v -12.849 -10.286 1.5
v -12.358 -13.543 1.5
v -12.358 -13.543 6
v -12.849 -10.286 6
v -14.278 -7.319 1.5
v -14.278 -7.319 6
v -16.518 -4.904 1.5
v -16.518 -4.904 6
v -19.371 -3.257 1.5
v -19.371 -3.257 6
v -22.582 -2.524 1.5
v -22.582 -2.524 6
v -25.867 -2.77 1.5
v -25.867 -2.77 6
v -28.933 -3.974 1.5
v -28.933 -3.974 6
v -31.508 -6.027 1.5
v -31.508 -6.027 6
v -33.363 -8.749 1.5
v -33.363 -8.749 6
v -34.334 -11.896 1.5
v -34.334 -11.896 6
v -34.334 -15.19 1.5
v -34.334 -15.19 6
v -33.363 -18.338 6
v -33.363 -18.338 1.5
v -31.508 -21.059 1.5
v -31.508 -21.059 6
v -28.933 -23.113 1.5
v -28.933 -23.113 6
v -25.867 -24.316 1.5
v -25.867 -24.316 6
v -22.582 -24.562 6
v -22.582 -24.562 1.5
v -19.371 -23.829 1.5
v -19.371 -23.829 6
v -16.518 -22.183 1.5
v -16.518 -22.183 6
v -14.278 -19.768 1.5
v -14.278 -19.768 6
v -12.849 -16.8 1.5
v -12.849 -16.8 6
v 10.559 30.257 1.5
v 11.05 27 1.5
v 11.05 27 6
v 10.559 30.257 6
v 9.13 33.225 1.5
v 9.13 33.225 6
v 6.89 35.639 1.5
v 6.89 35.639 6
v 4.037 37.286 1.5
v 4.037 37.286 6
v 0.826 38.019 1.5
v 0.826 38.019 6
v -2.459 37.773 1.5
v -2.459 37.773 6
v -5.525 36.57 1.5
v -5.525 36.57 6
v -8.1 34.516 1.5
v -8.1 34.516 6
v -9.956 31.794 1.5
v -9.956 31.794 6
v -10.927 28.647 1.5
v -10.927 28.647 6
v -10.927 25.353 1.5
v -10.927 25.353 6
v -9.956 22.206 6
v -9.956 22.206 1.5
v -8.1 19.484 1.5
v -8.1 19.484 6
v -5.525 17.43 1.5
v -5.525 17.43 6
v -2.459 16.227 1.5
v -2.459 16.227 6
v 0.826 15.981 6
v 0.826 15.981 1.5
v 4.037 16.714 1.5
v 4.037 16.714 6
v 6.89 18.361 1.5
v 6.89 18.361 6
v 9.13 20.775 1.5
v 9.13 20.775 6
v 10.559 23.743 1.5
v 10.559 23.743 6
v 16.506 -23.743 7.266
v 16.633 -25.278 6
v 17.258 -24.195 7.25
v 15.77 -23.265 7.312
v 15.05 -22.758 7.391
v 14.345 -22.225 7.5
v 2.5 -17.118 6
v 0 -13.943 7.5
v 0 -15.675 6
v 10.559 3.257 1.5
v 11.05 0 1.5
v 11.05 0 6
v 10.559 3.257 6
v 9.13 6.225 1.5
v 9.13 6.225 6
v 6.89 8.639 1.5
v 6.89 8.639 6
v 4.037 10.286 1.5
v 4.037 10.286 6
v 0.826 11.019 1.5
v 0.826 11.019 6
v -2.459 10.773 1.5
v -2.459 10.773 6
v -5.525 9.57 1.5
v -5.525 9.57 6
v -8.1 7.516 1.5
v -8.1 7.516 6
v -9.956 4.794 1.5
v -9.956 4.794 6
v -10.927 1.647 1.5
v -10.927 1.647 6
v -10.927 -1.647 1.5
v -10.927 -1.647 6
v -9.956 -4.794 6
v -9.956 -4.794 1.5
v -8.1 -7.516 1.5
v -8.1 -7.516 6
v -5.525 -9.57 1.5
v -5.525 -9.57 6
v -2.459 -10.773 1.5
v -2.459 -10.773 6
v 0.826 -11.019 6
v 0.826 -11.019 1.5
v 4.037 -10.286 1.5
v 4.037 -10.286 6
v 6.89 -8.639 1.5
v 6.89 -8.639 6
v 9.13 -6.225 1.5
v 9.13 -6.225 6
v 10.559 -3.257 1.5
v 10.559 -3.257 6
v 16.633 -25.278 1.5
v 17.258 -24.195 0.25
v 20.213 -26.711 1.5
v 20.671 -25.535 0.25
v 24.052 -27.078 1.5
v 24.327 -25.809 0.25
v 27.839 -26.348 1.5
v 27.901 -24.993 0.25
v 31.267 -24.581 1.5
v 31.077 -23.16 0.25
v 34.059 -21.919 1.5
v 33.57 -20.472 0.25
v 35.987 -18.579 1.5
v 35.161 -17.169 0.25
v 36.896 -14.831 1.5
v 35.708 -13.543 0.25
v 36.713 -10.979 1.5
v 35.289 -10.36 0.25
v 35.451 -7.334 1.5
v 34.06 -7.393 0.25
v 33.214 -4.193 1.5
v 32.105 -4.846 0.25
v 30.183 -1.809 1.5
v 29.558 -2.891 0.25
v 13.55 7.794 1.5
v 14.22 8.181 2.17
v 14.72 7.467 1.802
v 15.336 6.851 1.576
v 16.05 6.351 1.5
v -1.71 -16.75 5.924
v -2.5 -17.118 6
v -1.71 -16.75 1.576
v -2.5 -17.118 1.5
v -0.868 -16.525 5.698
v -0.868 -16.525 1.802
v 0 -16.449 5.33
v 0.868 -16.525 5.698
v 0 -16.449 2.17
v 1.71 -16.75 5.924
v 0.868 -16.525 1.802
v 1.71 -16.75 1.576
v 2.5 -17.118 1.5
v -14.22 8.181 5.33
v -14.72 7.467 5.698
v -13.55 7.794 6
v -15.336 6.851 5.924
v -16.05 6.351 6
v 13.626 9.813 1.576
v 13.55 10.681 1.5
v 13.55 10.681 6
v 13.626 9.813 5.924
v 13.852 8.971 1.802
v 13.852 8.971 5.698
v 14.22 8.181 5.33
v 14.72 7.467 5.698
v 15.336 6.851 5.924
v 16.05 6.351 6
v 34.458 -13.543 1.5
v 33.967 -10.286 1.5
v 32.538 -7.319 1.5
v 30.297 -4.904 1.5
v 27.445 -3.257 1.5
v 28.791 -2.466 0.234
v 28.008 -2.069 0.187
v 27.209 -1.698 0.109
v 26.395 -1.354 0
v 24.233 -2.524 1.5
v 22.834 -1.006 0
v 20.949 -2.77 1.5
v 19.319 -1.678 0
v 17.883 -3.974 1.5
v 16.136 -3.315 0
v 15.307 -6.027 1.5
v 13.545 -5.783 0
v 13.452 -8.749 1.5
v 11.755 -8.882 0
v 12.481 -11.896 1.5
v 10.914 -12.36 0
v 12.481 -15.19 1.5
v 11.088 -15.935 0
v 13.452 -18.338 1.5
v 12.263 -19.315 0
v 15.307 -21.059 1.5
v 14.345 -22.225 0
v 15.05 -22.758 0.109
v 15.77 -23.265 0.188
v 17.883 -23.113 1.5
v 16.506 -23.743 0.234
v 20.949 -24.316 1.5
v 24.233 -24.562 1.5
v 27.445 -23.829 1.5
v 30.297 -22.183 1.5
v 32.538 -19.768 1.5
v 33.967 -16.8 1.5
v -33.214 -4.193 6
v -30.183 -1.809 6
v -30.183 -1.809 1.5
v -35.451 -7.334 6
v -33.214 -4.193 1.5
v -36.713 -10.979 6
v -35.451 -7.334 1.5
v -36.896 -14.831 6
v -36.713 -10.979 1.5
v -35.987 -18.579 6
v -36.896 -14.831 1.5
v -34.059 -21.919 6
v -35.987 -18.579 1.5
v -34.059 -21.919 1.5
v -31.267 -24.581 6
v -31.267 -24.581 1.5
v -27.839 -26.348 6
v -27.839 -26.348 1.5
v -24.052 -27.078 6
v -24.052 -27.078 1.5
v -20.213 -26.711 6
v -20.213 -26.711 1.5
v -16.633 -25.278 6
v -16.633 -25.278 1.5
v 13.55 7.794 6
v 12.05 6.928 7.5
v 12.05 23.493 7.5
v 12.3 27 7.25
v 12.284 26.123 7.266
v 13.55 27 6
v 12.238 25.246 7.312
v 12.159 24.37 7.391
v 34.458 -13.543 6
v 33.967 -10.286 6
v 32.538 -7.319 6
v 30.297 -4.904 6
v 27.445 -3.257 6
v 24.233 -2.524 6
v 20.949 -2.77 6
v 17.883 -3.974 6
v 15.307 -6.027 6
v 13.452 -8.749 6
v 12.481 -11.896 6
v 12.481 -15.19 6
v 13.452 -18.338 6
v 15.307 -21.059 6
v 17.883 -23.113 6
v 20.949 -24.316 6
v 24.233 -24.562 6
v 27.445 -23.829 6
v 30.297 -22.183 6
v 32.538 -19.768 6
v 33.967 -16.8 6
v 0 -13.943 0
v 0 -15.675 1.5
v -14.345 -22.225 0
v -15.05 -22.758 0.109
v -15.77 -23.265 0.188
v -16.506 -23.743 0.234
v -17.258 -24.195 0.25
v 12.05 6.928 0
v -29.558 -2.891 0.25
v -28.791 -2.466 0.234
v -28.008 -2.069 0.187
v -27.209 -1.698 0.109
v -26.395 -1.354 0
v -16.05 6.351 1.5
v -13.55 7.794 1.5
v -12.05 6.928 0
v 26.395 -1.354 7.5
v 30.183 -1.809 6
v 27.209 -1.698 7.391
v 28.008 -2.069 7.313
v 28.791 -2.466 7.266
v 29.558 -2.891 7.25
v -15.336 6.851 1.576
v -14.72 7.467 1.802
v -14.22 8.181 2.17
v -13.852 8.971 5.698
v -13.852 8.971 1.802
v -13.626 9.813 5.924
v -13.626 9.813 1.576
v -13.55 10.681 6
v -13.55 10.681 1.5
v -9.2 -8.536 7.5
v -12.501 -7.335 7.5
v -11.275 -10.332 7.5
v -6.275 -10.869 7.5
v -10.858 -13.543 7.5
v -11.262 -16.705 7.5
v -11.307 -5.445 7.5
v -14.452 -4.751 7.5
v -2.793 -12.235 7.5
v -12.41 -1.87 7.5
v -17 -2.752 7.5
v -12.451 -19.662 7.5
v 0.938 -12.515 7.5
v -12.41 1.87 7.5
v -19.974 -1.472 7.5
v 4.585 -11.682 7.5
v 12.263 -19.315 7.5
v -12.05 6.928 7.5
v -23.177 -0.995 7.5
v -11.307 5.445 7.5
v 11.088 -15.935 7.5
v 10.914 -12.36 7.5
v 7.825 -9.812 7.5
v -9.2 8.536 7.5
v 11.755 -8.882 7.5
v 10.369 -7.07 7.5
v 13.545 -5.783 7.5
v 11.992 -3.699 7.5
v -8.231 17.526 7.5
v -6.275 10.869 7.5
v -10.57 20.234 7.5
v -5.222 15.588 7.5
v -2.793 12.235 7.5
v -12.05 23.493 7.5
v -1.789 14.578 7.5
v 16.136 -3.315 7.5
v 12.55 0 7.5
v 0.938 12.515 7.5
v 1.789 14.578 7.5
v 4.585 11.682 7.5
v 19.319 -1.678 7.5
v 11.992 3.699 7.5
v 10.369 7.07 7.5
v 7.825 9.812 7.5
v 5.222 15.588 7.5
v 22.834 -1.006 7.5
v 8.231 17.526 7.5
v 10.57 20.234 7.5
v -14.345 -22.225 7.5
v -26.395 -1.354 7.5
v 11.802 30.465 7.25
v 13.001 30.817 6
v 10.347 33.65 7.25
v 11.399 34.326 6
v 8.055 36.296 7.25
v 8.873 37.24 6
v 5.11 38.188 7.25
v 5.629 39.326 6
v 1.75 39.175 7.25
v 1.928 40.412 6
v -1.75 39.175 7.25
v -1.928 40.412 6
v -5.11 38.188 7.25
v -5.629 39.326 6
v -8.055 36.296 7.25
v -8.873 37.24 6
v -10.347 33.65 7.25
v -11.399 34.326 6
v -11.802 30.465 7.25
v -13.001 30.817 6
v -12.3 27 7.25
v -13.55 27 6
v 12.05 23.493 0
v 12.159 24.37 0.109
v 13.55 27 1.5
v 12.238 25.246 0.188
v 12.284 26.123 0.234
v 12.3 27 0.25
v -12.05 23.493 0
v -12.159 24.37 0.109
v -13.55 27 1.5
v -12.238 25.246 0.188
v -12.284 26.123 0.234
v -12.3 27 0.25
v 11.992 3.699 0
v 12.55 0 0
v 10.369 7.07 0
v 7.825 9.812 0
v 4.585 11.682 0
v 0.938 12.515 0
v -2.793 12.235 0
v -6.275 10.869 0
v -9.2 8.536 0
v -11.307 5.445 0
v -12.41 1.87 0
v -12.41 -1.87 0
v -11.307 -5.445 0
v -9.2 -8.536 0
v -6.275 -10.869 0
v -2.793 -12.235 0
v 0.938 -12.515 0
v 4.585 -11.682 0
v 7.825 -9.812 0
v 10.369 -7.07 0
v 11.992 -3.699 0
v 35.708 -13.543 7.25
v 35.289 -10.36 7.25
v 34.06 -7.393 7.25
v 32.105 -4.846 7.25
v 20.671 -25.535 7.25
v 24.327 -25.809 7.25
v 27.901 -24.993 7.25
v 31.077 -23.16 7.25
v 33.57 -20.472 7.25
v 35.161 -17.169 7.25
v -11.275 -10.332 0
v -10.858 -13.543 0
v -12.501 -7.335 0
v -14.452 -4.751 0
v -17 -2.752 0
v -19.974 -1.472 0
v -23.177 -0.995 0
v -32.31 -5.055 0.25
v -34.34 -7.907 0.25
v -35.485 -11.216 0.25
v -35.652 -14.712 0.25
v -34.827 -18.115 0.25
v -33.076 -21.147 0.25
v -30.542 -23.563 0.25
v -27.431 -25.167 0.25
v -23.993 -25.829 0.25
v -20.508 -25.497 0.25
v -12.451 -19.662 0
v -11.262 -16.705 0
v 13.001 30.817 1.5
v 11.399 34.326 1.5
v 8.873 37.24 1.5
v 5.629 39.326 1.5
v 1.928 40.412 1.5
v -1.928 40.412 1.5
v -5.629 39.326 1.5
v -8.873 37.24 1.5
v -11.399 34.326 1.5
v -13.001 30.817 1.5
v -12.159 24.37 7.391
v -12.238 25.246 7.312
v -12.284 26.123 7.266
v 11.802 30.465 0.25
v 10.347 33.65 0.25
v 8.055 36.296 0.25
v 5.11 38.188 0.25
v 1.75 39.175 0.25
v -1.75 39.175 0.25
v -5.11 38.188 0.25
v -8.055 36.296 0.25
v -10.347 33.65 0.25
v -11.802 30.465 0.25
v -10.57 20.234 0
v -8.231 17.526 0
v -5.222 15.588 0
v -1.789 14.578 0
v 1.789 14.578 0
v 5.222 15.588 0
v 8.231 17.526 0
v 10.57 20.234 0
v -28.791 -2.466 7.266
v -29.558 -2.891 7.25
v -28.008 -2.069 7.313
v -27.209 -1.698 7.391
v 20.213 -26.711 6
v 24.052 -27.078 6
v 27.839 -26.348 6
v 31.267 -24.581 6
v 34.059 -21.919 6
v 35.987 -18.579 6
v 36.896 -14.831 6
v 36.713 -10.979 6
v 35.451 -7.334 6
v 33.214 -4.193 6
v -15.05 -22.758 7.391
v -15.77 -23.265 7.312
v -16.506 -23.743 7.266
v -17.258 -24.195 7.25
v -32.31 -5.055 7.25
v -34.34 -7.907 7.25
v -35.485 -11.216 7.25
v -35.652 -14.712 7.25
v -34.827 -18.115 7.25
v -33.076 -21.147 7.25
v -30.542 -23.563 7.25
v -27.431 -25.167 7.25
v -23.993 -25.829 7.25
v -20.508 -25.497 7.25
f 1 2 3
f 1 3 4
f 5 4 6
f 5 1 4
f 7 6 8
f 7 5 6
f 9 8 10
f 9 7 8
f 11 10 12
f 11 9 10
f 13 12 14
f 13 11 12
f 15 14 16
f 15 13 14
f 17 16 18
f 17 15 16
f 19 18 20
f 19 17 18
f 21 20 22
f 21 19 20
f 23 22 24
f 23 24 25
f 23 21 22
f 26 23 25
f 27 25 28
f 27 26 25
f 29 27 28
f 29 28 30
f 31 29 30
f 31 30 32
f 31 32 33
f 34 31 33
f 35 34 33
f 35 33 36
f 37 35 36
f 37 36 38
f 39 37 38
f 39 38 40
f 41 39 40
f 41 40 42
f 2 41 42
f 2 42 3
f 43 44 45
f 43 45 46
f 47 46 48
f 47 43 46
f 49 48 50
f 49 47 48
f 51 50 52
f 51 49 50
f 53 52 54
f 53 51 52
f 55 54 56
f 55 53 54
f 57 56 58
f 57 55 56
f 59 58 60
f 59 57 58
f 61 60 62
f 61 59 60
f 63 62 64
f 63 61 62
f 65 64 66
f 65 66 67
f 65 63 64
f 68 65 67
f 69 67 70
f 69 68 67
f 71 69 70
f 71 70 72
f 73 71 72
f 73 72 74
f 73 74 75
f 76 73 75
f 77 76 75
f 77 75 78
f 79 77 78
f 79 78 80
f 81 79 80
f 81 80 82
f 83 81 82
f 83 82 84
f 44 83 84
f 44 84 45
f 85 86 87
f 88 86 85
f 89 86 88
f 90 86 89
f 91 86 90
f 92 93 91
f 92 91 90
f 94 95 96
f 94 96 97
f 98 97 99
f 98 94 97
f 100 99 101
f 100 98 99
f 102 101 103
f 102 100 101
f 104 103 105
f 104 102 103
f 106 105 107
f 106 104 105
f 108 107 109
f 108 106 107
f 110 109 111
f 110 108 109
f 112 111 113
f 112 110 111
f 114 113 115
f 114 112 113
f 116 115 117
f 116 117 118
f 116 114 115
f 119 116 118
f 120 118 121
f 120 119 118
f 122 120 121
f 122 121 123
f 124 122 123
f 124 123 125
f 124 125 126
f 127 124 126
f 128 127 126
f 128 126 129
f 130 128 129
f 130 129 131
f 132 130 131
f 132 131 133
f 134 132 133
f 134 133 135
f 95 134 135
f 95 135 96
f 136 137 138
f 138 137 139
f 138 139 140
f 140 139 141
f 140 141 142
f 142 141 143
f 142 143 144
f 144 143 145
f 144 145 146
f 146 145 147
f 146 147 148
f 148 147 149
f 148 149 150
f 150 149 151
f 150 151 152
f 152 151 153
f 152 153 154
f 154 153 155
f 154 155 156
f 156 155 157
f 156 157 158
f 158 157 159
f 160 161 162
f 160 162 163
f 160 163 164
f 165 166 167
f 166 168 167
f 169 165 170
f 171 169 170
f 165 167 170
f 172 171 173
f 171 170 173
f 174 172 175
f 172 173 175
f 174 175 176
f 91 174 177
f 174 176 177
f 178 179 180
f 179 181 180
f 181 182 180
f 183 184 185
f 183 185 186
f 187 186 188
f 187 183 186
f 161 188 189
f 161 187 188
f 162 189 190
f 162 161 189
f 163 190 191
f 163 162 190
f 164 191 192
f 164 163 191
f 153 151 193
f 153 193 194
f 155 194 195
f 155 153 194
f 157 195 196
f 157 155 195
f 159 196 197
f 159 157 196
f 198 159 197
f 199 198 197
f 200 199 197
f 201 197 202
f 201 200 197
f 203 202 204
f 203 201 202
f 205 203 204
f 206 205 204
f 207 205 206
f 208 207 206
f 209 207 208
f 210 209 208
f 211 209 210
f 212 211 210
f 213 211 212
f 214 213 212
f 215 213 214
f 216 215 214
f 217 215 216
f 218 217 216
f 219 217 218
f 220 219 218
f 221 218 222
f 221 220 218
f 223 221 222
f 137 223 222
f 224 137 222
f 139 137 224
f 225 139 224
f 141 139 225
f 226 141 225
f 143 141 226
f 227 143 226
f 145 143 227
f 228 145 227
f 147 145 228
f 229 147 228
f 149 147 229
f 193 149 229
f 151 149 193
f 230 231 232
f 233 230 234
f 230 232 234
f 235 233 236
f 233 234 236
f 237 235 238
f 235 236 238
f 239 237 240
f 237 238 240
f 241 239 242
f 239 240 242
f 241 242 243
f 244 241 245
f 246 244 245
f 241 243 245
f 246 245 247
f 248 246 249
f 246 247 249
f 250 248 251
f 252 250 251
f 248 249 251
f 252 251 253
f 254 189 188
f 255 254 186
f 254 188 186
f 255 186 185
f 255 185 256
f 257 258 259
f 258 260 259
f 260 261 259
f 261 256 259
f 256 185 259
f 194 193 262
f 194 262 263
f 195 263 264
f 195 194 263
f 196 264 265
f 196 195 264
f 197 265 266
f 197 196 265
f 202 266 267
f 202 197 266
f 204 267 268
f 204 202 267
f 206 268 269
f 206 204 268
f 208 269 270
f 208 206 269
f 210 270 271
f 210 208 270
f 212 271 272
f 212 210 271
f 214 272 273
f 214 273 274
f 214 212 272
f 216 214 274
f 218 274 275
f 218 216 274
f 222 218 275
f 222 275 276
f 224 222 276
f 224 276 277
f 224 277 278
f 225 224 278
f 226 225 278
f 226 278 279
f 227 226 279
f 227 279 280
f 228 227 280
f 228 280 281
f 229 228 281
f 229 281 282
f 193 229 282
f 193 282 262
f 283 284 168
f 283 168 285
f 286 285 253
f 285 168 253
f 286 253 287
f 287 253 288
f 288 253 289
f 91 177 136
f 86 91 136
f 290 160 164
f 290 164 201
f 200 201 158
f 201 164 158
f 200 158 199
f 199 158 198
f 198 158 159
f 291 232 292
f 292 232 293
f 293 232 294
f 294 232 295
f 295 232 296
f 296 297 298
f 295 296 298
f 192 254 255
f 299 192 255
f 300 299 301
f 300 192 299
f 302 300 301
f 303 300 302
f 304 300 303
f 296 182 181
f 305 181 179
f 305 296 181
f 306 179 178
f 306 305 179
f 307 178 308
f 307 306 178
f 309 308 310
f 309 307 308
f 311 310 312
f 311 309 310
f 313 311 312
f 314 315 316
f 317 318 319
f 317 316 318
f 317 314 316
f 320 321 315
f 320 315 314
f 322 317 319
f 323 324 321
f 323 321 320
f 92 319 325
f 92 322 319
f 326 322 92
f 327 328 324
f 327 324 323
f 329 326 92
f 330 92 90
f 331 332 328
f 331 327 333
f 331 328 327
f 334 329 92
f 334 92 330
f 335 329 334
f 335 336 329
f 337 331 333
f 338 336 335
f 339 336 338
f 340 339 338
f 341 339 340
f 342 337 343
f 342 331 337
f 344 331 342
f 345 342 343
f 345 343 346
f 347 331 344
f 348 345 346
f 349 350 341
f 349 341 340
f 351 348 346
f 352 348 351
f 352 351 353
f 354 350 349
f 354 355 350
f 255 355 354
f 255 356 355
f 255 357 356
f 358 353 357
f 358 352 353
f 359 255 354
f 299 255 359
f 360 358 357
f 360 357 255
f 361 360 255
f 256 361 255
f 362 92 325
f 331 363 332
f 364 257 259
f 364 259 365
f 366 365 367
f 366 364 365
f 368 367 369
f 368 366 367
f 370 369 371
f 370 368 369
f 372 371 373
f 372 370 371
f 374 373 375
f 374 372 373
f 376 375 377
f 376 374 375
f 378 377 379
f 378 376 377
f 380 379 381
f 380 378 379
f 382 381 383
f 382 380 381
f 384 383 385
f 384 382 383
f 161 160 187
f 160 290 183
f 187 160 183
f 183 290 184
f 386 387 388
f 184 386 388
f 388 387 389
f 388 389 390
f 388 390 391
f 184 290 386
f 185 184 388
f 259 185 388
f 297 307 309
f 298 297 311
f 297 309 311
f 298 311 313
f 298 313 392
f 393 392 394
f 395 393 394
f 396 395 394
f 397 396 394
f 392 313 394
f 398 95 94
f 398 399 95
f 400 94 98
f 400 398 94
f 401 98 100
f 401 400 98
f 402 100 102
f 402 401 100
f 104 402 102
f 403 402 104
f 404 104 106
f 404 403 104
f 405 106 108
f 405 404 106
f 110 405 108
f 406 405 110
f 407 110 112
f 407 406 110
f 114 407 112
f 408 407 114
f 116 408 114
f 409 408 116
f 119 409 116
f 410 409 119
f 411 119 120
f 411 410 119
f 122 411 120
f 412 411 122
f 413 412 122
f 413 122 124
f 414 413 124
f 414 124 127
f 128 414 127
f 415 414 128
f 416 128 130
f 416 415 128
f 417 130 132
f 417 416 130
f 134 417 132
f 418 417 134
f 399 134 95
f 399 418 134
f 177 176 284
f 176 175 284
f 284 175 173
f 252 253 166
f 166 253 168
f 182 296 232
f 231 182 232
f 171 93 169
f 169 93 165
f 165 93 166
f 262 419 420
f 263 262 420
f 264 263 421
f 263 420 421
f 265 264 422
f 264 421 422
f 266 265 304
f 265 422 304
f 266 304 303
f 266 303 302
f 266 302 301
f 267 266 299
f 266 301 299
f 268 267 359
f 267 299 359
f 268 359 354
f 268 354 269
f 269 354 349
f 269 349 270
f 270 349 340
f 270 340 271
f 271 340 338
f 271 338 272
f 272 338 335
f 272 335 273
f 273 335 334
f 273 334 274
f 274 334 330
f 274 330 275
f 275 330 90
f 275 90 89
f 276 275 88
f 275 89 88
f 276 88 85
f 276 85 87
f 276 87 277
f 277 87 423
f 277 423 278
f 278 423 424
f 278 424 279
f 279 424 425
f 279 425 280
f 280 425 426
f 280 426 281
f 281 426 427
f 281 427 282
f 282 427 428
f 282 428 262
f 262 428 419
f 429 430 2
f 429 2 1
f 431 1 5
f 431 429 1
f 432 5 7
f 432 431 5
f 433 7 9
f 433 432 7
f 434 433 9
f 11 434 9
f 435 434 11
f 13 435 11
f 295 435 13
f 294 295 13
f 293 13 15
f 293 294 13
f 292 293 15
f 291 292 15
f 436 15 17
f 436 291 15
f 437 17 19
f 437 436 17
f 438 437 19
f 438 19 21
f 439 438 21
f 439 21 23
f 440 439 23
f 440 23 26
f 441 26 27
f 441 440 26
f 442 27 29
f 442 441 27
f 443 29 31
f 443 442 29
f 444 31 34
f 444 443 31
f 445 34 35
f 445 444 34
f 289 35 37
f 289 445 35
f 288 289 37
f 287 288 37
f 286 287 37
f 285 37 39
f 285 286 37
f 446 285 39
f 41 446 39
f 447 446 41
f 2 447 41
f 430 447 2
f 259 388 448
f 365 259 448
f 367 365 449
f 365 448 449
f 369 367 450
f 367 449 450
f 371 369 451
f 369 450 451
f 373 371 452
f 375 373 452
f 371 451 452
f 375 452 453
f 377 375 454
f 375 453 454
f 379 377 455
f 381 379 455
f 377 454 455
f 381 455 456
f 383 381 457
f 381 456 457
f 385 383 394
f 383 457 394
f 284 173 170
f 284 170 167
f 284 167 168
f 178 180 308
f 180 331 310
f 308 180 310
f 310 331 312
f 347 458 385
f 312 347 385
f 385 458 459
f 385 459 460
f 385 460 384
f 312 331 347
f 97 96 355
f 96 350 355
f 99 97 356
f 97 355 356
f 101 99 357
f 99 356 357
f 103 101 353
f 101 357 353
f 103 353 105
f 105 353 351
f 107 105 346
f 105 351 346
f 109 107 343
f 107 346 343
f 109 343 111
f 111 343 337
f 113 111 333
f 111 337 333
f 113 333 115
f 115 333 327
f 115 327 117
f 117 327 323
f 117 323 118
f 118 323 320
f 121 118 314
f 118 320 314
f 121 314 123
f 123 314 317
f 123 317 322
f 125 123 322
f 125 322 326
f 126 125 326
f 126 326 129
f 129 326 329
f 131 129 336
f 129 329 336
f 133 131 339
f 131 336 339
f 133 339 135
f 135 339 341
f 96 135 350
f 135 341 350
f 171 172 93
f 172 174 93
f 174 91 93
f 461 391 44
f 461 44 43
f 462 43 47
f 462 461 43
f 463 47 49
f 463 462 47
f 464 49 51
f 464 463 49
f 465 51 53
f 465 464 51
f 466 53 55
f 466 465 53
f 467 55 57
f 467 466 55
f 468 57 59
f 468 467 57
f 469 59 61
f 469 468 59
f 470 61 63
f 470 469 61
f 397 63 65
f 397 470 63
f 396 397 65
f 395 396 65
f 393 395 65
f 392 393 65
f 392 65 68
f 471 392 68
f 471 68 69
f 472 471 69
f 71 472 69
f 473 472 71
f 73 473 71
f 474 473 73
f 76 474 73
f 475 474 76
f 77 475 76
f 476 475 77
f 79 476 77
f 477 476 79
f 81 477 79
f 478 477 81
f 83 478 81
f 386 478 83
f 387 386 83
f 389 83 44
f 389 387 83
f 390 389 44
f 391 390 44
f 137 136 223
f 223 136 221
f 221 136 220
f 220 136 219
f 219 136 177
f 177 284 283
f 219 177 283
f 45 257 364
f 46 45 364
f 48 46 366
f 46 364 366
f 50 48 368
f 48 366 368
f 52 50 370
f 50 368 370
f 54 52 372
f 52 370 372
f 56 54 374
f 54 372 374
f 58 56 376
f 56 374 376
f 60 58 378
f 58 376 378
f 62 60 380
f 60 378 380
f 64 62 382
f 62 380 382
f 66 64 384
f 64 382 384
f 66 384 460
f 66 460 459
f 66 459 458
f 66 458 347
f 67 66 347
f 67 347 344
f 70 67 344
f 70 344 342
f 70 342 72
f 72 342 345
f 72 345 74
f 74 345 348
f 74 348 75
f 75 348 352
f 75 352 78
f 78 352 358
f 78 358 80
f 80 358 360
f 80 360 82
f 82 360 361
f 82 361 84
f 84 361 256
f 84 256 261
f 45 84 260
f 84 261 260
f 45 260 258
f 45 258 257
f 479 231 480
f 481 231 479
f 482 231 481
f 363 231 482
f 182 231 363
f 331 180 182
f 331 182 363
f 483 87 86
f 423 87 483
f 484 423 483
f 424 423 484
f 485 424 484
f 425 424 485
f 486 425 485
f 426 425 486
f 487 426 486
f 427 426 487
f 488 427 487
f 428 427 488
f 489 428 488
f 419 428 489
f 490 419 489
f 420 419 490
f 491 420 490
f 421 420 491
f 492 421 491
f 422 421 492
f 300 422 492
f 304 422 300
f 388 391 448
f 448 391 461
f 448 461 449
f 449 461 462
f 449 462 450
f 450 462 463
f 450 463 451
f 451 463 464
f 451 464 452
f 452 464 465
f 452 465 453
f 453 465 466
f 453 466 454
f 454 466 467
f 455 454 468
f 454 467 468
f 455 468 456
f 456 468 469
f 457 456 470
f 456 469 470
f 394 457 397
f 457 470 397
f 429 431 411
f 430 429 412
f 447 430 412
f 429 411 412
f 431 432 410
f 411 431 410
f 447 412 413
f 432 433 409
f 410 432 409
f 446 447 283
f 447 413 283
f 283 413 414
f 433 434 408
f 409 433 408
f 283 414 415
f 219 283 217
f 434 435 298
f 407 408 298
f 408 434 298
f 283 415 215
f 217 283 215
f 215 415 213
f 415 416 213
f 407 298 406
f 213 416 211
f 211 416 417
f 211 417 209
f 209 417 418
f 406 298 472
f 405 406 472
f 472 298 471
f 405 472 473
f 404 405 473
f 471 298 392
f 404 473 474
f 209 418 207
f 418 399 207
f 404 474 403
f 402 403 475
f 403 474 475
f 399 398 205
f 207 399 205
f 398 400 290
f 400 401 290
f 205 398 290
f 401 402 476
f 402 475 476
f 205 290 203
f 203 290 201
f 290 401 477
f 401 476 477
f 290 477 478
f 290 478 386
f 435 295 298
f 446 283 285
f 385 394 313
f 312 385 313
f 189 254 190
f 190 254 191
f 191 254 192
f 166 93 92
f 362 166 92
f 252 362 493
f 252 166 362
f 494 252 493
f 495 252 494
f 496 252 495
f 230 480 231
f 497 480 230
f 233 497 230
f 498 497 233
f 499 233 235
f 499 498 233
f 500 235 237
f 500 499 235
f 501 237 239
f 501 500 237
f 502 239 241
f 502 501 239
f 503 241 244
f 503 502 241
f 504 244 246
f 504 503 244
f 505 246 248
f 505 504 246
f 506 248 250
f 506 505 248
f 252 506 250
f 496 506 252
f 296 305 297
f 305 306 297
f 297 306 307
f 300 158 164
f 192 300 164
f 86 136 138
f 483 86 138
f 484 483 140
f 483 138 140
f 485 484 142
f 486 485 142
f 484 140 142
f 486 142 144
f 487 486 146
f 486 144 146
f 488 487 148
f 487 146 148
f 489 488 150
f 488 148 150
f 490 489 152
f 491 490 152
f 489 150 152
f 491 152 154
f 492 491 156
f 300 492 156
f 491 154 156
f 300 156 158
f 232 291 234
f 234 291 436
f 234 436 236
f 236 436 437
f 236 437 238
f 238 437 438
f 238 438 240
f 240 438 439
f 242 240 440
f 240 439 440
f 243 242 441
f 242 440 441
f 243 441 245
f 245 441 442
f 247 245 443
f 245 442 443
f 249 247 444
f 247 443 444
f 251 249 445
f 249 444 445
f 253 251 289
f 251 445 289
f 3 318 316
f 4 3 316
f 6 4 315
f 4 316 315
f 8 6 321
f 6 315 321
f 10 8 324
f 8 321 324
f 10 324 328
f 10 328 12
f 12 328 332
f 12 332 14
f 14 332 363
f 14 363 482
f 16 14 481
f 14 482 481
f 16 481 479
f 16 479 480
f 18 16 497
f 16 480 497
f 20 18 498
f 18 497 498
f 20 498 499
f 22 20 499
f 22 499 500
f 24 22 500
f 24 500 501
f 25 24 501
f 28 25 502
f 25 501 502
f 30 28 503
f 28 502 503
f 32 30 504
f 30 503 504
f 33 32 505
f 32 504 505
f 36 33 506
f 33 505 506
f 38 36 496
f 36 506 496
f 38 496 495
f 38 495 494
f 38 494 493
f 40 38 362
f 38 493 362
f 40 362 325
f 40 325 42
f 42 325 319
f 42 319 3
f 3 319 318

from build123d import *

# Parameters (mm, degrees)
F0_R          = 11.05
F1_DEPTH      = 7.5
F2_T4_DEPTH   = 23.0632958479
F2_T9_DEPTH   = 23.0632958479
F2_T14_DEPTH  = 23.0632958479
F2_T27_DEPTH  = 23.0632958479
F2_T32_DEPTH  = 23.0632958479
F2_T37_DEPTH  = 23.0632958479
F2_T50_DEPTH  = 23.0632958479
F2_T55_DEPTH  = 23.0632958479
F2_T60_DEPTH  = 23.0632958479
F2_T65_DEPTH  = 23.0632958479
F2_T70_DEPTH  = 23.0632958479
F2_T75_DEPTH  = 23.0632958479
F2_T78_ANGLE  = 180
F2_T80_ANGLE  = 180
F2_T82_ANGLE  = 180
F2_T84_ANGLE  = 180
F2_T86_ANGLE  = 180
F2_T88_ANGLE  = 180
F2_T93_DEPTH  = 23.0632958479
F2_T97_DEPTH  = 23.0632958479
F2_T104_DEPTH = 23.0632958479
F2_T108_DEPTH = 23.0632958479
F2_T115_DEPTH = 23.0632958479
F2_T119_DEPTH = 23.0632958479
F2_T126_DEPTH = 23.0632958479
F2_T130_DEPTH = 23.0632958479
F2_T137_DEPTH = 23.0632958479
F2_T141_DEPTH = 23.0632958479
F2_T148_DEPTH = 23.0632958479
F2_T152_DEPTH = 23.0632958479
F3_T4_DEPTH   = 18.9337567297
F3_T10_DEPTH  = 18.9337567297
F3_T16_DEPTH  = 18.9337567297
F3_T22_DEPTH  = 18.9337567297
F3_T28_DEPTH  = 18.9337567297
F3_T34_DEPTH  = 18.9337567297
F3_T40_DEPTH  = 18.9337567297
F3_T46_DEPTH  = 18.9337567297
F3_T52_DEPTH  = 18.9337567297
F3_T58_DEPTH  = 18.9337567297


# Not quite as in the source:
# - a fillet or chamfer that OpenCascade refuses, or shapes differently, is made with other operations: its cross-section is extruded or revolved along the edge and cut away or added


with BuildPart() as f1:
    # F0 (on Top) → F1 (new body)
    with BuildSketch(Plane.XY):
        with BuildLine():
            ThreePointArc((13.55, 27), (0, 40.55), (-13.55, 27))
            Line((-13.55, 27), (-13.55, 7.7942286341))
            Line((-13.55, 7.7942286341), (-30.1826859022, -1.8086570489))
            ThreePointArc((-30.1826859022, -1.8086570489), (-35.1423301235, -20.3183012702), (-16.6326859022, -25.2779454915))
            Line((-16.6326859022, -25.2779454915), (0, -15.6750598085))
            Line((0, -15.6750598085), (16.6326859022, -25.2779454915))
            ThreePointArc((16.6326859022, -25.2779454915), (35.1423301235, -20.3183012702), (30.1826859022, -1.8086570489))
            Line((30.1826859022, -1.8086570489), (13.55, 7.7942286341))
            Line((13.55, 7.7942286341), (13.55, 27))
        make_face()
        with Locations((-23.4076859022, -13.5433012702)):
            Circle(F0_R, mode=Mode.SUBTRACT)
        with Locations((23.4076859022, -13.5433012702)):
            Circle(F0_R, mode=Mode.SUBTRACT)
        Circle(F0_R, mode=Mode.SUBTRACT)
        with Locations((0, 27)):
            Circle(F0_R, mode=Mode.SUBTRACT)
    extrude(amount=F1_DEPTH)

    # F2: chamfer of 1.5 on 20 edges, made by hand


with BuildPart() as f2_tool2:
    # F2_s3 → F2_t4 (new body)
    with BuildSketch(Plane(origin=(-23.4201859022, -13.5216506351, 0), x_dir=(0, 0, 1), z_dir=(0.8660254038, 0.5, 0))):
        Polygon((6, 13.575), (7.5, 12.075), (7.5, 13.575), align=None)
    extrude(amount=F2_T4_DEPTH)

    split(bisect_by=Plane(origin=(-6.7875, -11.7562948564, 0), x_dir=(0, 0, 1), z_dir=(-0.5, -0.8660254038, 0)), keep=Keep.TOP)


with BuildPart() as f1_1:
    add(f1.part)

    # F2_t1: cut F2_tool2
    add(f2_tool2.part, mode=Mode.SUBTRACT)


with BuildPart() as f2_tool7:
    # F2_s8 → F2_t9 (new body)
    with BuildSketch(Plane.XZ.offset(-27)):
        Polygon((-13.55, 6), (-12.05, 7.5), (-13.55, 7.5), align=None)
    extrude(amount=F2_T9_DEPTH)

    split(bisect_by=Plane(origin=(-6.7625, 11.7129935862, 0), x_dir=(0, 0, 1), z_dir=(-0.5, 0.8660254038, 0)), keep=Keep.TOP)


with BuildPart() as f1_2:
    add(f1_1.part)

    # F2_t6: cut F2_tool7
    add(f2_tool7.part, mode=Mode.SUBTRACT)


with BuildPart() as f2_tool12:
    # F2_s13 → F2_t14 (new body)
    with BuildSketch(Plane(origin=(3.4467858029, -1.9900027112, 0), x_dir=(0, 0, 1), z_dir=(0.8660254038, -0.5, 0))):
        Polygon((6, 13.575), (7.5, 12.075), (7.5, 13.575), align=None)
    extrude(amount=F2_T14_DEPTH)

    split(bisect_by=Plane(origin=(6.7875, -11.7562948564, 0), x_dir=(0, 0, 1), z_dir=(0.5, -0.8660254038, 0)), keep=Keep.TOP)


with BuildPart() as f1_3:
    add(f1_2.part)

    # F2_t11: cut F2_tool12
    add(f2_tool12.part, mode=Mode.SUBTRACT)

    # F2_s16 → F2_t17 (revolve, cut)
    with BuildSketch(Plane.XZ.offset(13.5433012702)):
        Polygon((-12.3576859022, 6), (-10.8576859022, 7.5), (-12.3576859022, 7.5), align=None)
    revolve(axis=Axis((-23.4076859022, -13.5433012702, 7.5), (0, 0, 1)), mode=Mode.SUBTRACT)

    # F2_s18 → F2_t19 (revolve, cut)
    with BuildSketch(Plane.XZ):
        Polygon((11.05, 6), (12.55, 7.5), (11.05, 7.5), align=None)
    revolve(axis=Axis((0, 0, 7.5), (0, 0, 1)), mode=Mode.SUBTRACT)

    # F2_s20 → F2_t21 (revolve, cut)
    with BuildSketch(Plane.XZ.offset(-27)):
        Polygon((11.05, 6), (12.55, 7.5), (11.05, 7.5), align=None)
    revolve(axis=Axis((0, 27, 7.5), (0, 0, 1)), mode=Mode.SUBTRACT)

    # F2_s22 → F2_t23 (revolve, cut)
    with BuildSketch(Plane.XZ.offset(13.5433012702)):
        Polygon((34.4576859022, 6), (35.9576859022, 7.5), (34.4576859022, 7.5), align=None)
    revolve(axis=Axis((23.4076859022, -13.5433012702, 7.5), (0, 0, 1)), mode=Mode.SUBTRACT)


with BuildPart() as f2_tool25:
    # F2_s26 → F2_t27 (new body)
    with BuildSketch(Plane.XZ.offset(-27)):
        Polygon((-13.55, 1.5), (-12.05, 0), (-13.55, 0), align=None)
    extrude(amount=F2_T27_DEPTH)

    split(bisect_by=Plane(origin=(-6.7625, 11.7129935862, 0), x_dir=(0, 0, 1), z_dir=(-0.5, 0.8660254038, 0)), keep=Keep.TOP)


with BuildPart() as f1_4:
    add(f1_3.part)

    # F2_t24: cut F2_tool25
    add(f2_tool25.part, mode=Mode.SUBTRACT)


with BuildPart() as f2_tool30:
    # F2_s31 → F2_t32 (new body)
    with BuildSketch(Plane(origin=(-3.4467858029, -1.9900027112, 0), x_dir=(0, 0, 1), z_dir=(-0.8660254038, -0.5, 0))):
        Polygon((1.5, 13.525), (0, 12.025), (0, 13.525), align=None)
    extrude(amount=F2_T32_DEPTH)

    split(bisect_by=Plane.YZ.offset(-13.55), keep=Keep.BOTTOM)


with BuildPart() as f1_5:
    add(f1_4.part)

    # F2_t29: cut F2_tool30
    add(f2_tool30.part, mode=Mode.SUBTRACT)


with BuildPart() as f2_tool35:
    # F2_s36 → F2_t37 (new body)
    with BuildSketch(Plane(origin=(3.4467858029, -1.9900027112, 0), x_dir=(0, 0, 1), z_dir=(0.8660254038, -0.5, 0))):
        Polygon((1.5, 13.575), (0, 12.075), (0, 13.575), align=None)
    extrude(amount=F2_T37_DEPTH)

    split(bisect_by=Plane(origin=(6.7875, -11.7562948564, 0), x_dir=(0, 0, 1), z_dir=(0.5, -0.8660254038, 0)), keep=Keep.TOP)


with BuildPart() as f1_6:
    add(f1_5.part)

    # F2_t34: cut F2_tool35
    add(f2_tool35.part, mode=Mode.SUBTRACT)

    # F2_s39 → F2_t40 (revolve, cut)
    with BuildSketch(Plane.XZ.offset(13.5433012702)):
        Polygon((34.4576859022, 1.5), (35.9576859022, 0), (34.4576859022, 0), align=None)
    revolve(axis=Axis((23.4076859022, -13.5433012702, 0), (0, 0, 1)), mode=Mode.SUBTRACT)

    # F2_s41 → F2_t42 (revolve, cut)
    with BuildSketch(Plane.XZ):
        Polygon((11.05, 1.5), (12.55, 0), (11.05, 0), align=None)
    revolve(axis=Axis((0, 0, 0), (0, 0, 1)), mode=Mode.SUBTRACT)

    # F2_s43 → F2_t44 (revolve, cut)
    with BuildSketch(Plane.XZ.offset(13.5433012702)):
        Polygon((-12.3576859022, 1.5), (-10.8576859022, 0), (-12.3576859022, 0), align=None)
    revolve(axis=Axis((-23.4076859022, -13.5433012702, 0), (0, 0, 1)), mode=Mode.SUBTRACT)

    # F2_s45 → F2_t46 (revolve, cut)
    with BuildSketch(Plane.XZ.offset(-27)):
        Polygon((11.05, 1.5), (12.55, 0), (11.05, 0), align=None)
    revolve(axis=Axis((0, 27, 0), (0, 0, 1)), mode=Mode.SUBTRACT)


with BuildPart() as f2_tool48:
    # F2_s49 → F2_t50 (new body)
    with BuildSketch(Plane(origin=(-23.4201859022, -13.5216506351, 0), x_dir=(0, 0, 1), z_dir=(0.8660254038, 0.5, 0))):
        Polygon((1.5, 13.575), (0, 12.075), (0, 13.575), align=None)
    extrude(amount=F2_T50_DEPTH)

    split(bisect_by=Plane(origin=(-6.7875, -11.7562948564, 0), x_dir=(0, 0, 1), z_dir=(-0.5, -0.8660254038, 0)), keep=Keep.TOP)


with BuildPart() as f1_7:
    add(f1_6.part)

    # F2_t47: cut F2_tool48
    add(f2_tool48.part, mode=Mode.SUBTRACT)


with BuildPart() as f2_tool53:
    # F2_s54 → F2_t55 (new body)
    with BuildSketch(Plane(origin=(23.4201859022, -13.5216506351, 0), x_dir=(0, 0, 1), z_dir=(-0.8660254038, 0.5, 0))):
        Polygon((1.5, 13.525), (0, 12.025), (0, 13.525), align=None)
    extrude(amount=F2_T55_DEPTH)

    split(bisect_by=Plane.YZ.offset(13.55), keep=Keep.TOP)


with BuildPart() as f1_8:
    add(f1_7.part)

    # F2_t52: cut F2_tool53
    add(f2_tool53.part, mode=Mode.SUBTRACT)


with BuildPart() as f2_tool58:
    # F2_s59 → F2_t60 (new body)
    with BuildSketch(Plane(origin=(23.4201859022, -13.5216506351, 0), x_dir=(0, 0, 1), z_dir=(-0.8660254038, 0.5, 0))):
        Polygon((6, 13.525), (7.5, 12.025), (7.5, 13.525), align=None)
    extrude(amount=F2_T60_DEPTH)

    split(bisect_by=Plane.YZ.offset(13.55), keep=Keep.TOP)


with BuildPart() as f1_9:
    add(f1_8.part)

    # F2_t57: cut F2_tool58
    add(f2_tool58.part, mode=Mode.SUBTRACT)


with BuildPart() as f2_tool63:
    # F2_s64 → F2_t65 (new body)
    with BuildSketch(Plane.XZ.offset(-3.9367041521)):
        Polygon((13.55, 1.5), (12.05, 0), (13.55, 0), align=None)
    extrude(amount=-F2_T65_DEPTH)

    split(bisect_by=Plane(origin=(6.7625, 11.7129935862, 0), x_dir=(0, 0, 1), z_dir=(0.5, 0.8660254038, 0)), keep=Keep.TOP)


with BuildPart() as f1_10:
    add(f1_9.part)

    # F2_t62: cut F2_tool63
    add(f2_tool63.part, mode=Mode.SUBTRACT)


with BuildPart() as f2_tool68:
    # F2_s69 → F2_t70 (new body)
    with BuildSketch(Plane.XZ.offset(-3.9367041521)):
        Polygon((13.55, 6), (12.05, 7.5), (13.55, 7.5), align=None)
    extrude(amount=-F2_T70_DEPTH)

    split(bisect_by=Plane(origin=(6.7625, 11.7129935862, 0), x_dir=(0, 0, 1), z_dir=(0.5, 0.8660254038, 0)), keep=Keep.TOP)


with BuildPart() as f1_11:
    add(f1_10.part)

    # F2_t67: cut F2_tool68
    add(f2_tool68.part, mode=Mode.SUBTRACT)


with BuildPart() as f2_tool73:
    # F2_s74 → F2_t75 (new body)
    with BuildSketch(Plane(origin=(-3.4467858029, -1.9900027112, 0), x_dir=(0, 0, 1), z_dir=(-0.8660254038, -0.5, 0))):
        Polygon((6, 13.525), (7.5, 12.025), (7.5, 13.525), align=None)
    extrude(amount=F2_T75_DEPTH)

    split(bisect_by=Plane.YZ.offset(-13.55), keep=Keep.BOTTOM)


with BuildPart() as f1_12:
    add(f1_11.part)

    # F2_t72: cut F2_tool73
    add(f2_tool73.part, mode=Mode.SUBTRACT)

    # F2_s77 → F2_t78 (revolve, cut)
    with BuildSketch(Plane(origin=(-23.4201859022, -13.5216506351, 0), x_dir=(0, 0, 1), z_dir=(0.8660254038, 0.5, 0))):
        Polygon((6, -13.525), (7.5, -12.025), (7.5, -13.525), align=None)
    revolve(axis=Axis((-23.4076859022, -13.5433012702, 7.5), (0, 0, 1)), revolution_arc=F2_T78_ANGLE, mode=Mode.SUBTRACT)

    # F2_s79 → F2_t80 (revolve, cut)
    with BuildSketch(Plane.XZ.offset(-27)):
        Polygon((13.55, 6), (12.05, 7.5), (13.55, 7.5), align=None)
    revolve(axis=Axis((0, 27, 7.5), (0, 0, 1)), revolution_arc=F2_T80_ANGLE, mode=Mode.SUBTRACT)

    # F2_s81 → F2_t82 (revolve, cut)
    with BuildSketch(Plane.XZ.offset(-27)):
        Polygon((13.55, 1.5), (12.05, 0), (13.55, 0), align=None)
    revolve(axis=Axis((0, 27, 0), (0, 0, 1)), revolution_arc=F2_T82_ANGLE, mode=Mode.SUBTRACT)

    # F2_s83 → F2_t84 (revolve, cut)
    with BuildSketch(Plane(origin=(23.4201859022, -13.5216506351, 0), x_dir=(0, 0, 1), z_dir=(-0.8660254038, 0.5, 0))):
        Polygon((6, -13.575), (7.5, -12.075), (7.5, -13.575), align=None)
    revolve(axis=Axis((23.4076859022, -13.5433012702, 7.5), (0, 0, 1)), revolution_arc=F2_T84_ANGLE, mode=Mode.SUBTRACT)

    # F2_s85 → F2_t86 (revolve, cut)
    with BuildSketch(Plane(origin=(23.4201859022, -13.5216506351, 0), x_dir=(0, 0, 1), z_dir=(-0.8660254038, 0.5, 0))):
        Polygon((1.5, -13.575), (0, -12.075), (0, -13.575), align=None)
    revolve(axis=Axis((23.4076859022, -13.5433012702, 0), (0, 0, 1)), revolution_arc=F2_T86_ANGLE, mode=Mode.SUBTRACT)

    # F2_s87 → F2_t88 (revolve, cut)
    with BuildSketch(Plane(origin=(-23.4201859022, -13.5216506351, 0), x_dir=(0, 0, 1), z_dir=(0.8660254038, 0.5, 0))):
        Polygon((1.5, -13.525), (0, -12.025), (0, -13.525), align=None)
    revolve(axis=Axis((-23.4076859022, -13.5433012702, 0), (0, 0, 1)), revolution_arc=F2_T88_ANGLE, mode=Mode.SUBTRACT)


with BuildPart() as f2_tool91:
    # F2_s92 → F2_t93 (new body)
    with BuildSketch(Plane(origin=(-23.4201859022, -13.5216506351, 0), x_dir=(0, 0, 1), z_dir=(0.8660254038, 0.5, 0))):
        Polygon((6, 13.575), (7.5, 12.075), (7.5, 13.575), align=None)
    extrude(amount=F2_T93_DEPTH)

    split(bisect_by=Plane(origin=(-6.7875, -11.7562948564, 0), x_dir=(0, 0, 1), z_dir=(0.5, 0.8660254038, 0)), keep=Keep.TOP)


with BuildPart() as f2_tool95:
    # F2_s96 → F2_t97 (new body)
    with BuildSketch(Plane(origin=(3.4467858029, -1.9900027112, 0), x_dir=(0, 0, 1), z_dir=(0.8660254038, -0.5, 0))):
        Polygon((6, 13.575), (7.5, 12.075), (7.5, 13.575), align=None)
    extrude(amount=F2_T97_DEPTH)

    split(bisect_by=Plane(origin=(6.7875, -11.7562948564, 0), x_dir=(0, 0, 1), z_dir=(-0.5, 0.8660254038, 0)), keep=Keep.TOP)


with BuildPart() as f2_tool91_1:
    add(f2_tool91.part)

    # F2_t99: intersect F2_tool95
    add(f2_tool95.part, mode=Mode.INTERSECT)


with BuildPart() as f1_13:
    add(f1_12.part)

    # F2_t89: cut F2_tool91
    add(f2_tool91_1.part, mode=Mode.SUBTRACT)


with BuildPart() as f2_tool102:
    # F2_s103 → F2_t104 (new body)
    with BuildSketch(Plane.XZ.offset(-27)):
        Polygon((-13.55, 6), (-12.05, 7.5), (-13.55, 7.5), align=None)
    extrude(amount=F2_T104_DEPTH)

    split(bisect_by=Plane(origin=(-6.7625, 11.7129935862, 0), x_dir=(0, 0, 1), z_dir=(0.5, -0.8660254038, 0)), keep=Keep.TOP)


with BuildPart() as f2_tool106:
    # F2_s107 → F2_t108 (new body)
    with BuildSketch(Plane(origin=(-3.4467858029, -1.9900027112, 0), x_dir=(0, 0, 1), z_dir=(-0.8660254038, -0.5, 0))):
        Polygon((6, 13.525), (7.5, 12.025), (7.5, 13.525), align=None)
    extrude(amount=F2_T108_DEPTH)

    split(bisect_by=Plane.YZ.offset(-13.55), keep=Keep.TOP)


with BuildPart() as f2_tool102_1:
    add(f2_tool102.part)

    # F2_t110: intersect F2_tool106
    add(f2_tool106.part, mode=Mode.INTERSECT)


with BuildPart() as f1_14:
    add(f1_13.part)

    # F2_t100: cut F2_tool102
    add(f2_tool102_1.part, mode=Mode.SUBTRACT)


with BuildPart() as f2_tool113:
    # F2_s114 → F2_t115 (new body)
    with BuildSketch(Plane.XZ.offset(-27)):
        Polygon((-13.55, 1.5), (-12.05, 0), (-13.55, 0), align=None)
    extrude(amount=F2_T115_DEPTH)

    split(bisect_by=Plane(origin=(-6.7625, 11.7129935862, 0), x_dir=(0, 0, 1), z_dir=(0.5, -0.8660254038, 0)), keep=Keep.TOP)


with BuildPart() as f2_tool117:
    # F2_s118 → F2_t119 (new body)
    with BuildSketch(Plane(origin=(-3.4467858029, -1.9900027112, 0), x_dir=(0, 0, 1), z_dir=(-0.8660254038, -0.5, 0))):
        Polygon((1.5, 13.525), (0, 12.025), (0, 13.525), align=None)
    extrude(amount=F2_T119_DEPTH)

    split(bisect_by=Plane.YZ.offset(-13.55), keep=Keep.TOP)


with BuildPart() as f2_tool113_1:
    add(f2_tool113.part)

    # F2_t121: intersect F2_tool117
    add(f2_tool117.part, mode=Mode.INTERSECT)


with BuildPart() as f1_15:
    add(f1_14.part)

    # F2_t111: cut F2_tool113
    add(f2_tool113_1.part, mode=Mode.SUBTRACT)


with BuildPart() as f2_tool124:
    # F2_s125 → F2_t126 (new body)
    with BuildSketch(Plane(origin=(-23.4201859022, -13.5216506351, 0), x_dir=(0, 0, 1), z_dir=(0.8660254038, 0.5, 0))):
        Polygon((1.5, 13.575), (0, 12.075), (0, 13.575), align=None)
    extrude(amount=F2_T126_DEPTH)

    split(bisect_by=Plane(origin=(-6.7875, -11.7562948564, 0), x_dir=(0, 0, 1), z_dir=(0.5, 0.8660254038, 0)), keep=Keep.TOP)


with BuildPart() as f2_tool128:
    # F2_s129 → F2_t130 (new body)
    with BuildSketch(Plane(origin=(3.4467858029, -1.9900027112, 0), x_dir=(0, 0, 1), z_dir=(0.8660254038, -0.5, 0))):
        Polygon((1.5, 13.575), (0, 12.075), (0, 13.575), align=None)
    extrude(amount=F2_T130_DEPTH)

    split(bisect_by=Plane(origin=(6.7875, -11.7562948564, 0), x_dir=(0, 0, 1), z_dir=(-0.5, 0.8660254038, 0)), keep=Keep.TOP)


with BuildPart() as f2_tool124_1:
    add(f2_tool124.part)

    # F2_t132: intersect F2_tool128
    add(f2_tool128.part, mode=Mode.INTERSECT)


with BuildPart() as f1_16:
    add(f1_15.part)

    # F2_t122: cut F2_tool124
    add(f2_tool124_1.part, mode=Mode.SUBTRACT)


with BuildPart() as f2_tool135:
    # F2_s136 → F2_t137 (new body)
    with BuildSketch(Plane(origin=(23.4201859022, -13.5216506351, 0), x_dir=(0, 0, 1), z_dir=(-0.8660254038, 0.5, 0))):
        Polygon((1.5, 13.525), (0, 12.025), (0, 13.525), align=None)
    extrude(amount=F2_T137_DEPTH)

    split(bisect_by=Plane.YZ.offset(13.55), keep=Keep.BOTTOM)


with BuildPart() as f2_tool139:
    # F2_s140 → F2_t141 (new body)
    with BuildSketch(Plane.XZ.offset(-3.9367041521)):
        Polygon((13.55, 1.5), (12.05, 0), (13.55, 0), align=None)
    extrude(amount=-F2_T141_DEPTH)

    split(bisect_by=Plane(origin=(6.7625, 11.7129935862, 0), x_dir=(0, 0, 1), z_dir=(-0.5, -0.8660254038, 0)), keep=Keep.TOP)


with BuildPart() as f2_tool135_1:
    add(f2_tool135.part)

    # F2_t143: intersect F2_tool139
    add(f2_tool139.part, mode=Mode.INTERSECT)


with BuildPart() as f1_17:
    add(f1_16.part)

    # F2_t133: cut F2_tool135
    add(f2_tool135_1.part, mode=Mode.SUBTRACT)


with BuildPart() as f2_tool146:
    # F2_s147 → F2_t148 (new body)
    with BuildSketch(Plane(origin=(23.4201859022, -13.5216506351, 0), x_dir=(0, 0, 1), z_dir=(-0.8660254038, 0.5, 0))):
        Polygon((6, 13.525), (7.5, 12.025), (7.5, 13.525), align=None)
    extrude(amount=F2_T148_DEPTH)

    split(bisect_by=Plane.YZ.offset(13.55), keep=Keep.BOTTOM)


with BuildPart() as f2_tool150:
    # F2_s151 → F2_t152 (new body)
    with BuildSketch(Plane.XZ.offset(-3.9367041521)):
        Polygon((13.55, 6), (12.05, 7.5), (13.55, 7.5), align=None)
    extrude(amount=-F2_T152_DEPTH)

    split(bisect_by=Plane(origin=(6.7625, 11.7129935862, 0), x_dir=(0, 0, 1), z_dir=(-0.5, -0.8660254038, 0)), keep=Keep.TOP)


with BuildPart() as f2_tool146_1:
    add(f2_tool146.part)

    # F2_t154: intersect F2_tool150
    add(f2_tool150.part, mode=Mode.INTERSECT)


with BuildPart() as f1_18:
    add(f1_17.part)

    # F2_t144: cut F2_tool146
    add(f2_tool146_1.part, mode=Mode.SUBTRACT)

    # F3: fillet of radius 5 on 3 edges, made by hand


with BuildPart() as f3_tool2:
    # F3_s3 → F3_t4 (new body)
    with BuildSketch(Plane.XY.offset(-5.7168783649)):
        with BuildLine():
            ThreePointArc((-16.05, 6.3508529611), (-14.2198729811, 8.18097998), (-13.55, 10.68097998))
            Line((-13.55, 10.68097998), (-13.55, 7.7942286341))
            Line((-13.55, 7.7942286341), (-16.05, 6.3508529611))
        make_face()
    extrude(amount=F3_T4_DEPTH)

    split(bisect_by=Plane(origin=(-6.025, 0, -6.025), x_dir=(0, 1, 0), z_dir=(0.7071067812, 0, 0.7071067812)), keep=Keep.TOP)

    split(bisect_by=Plane(origin=(-4.88125, 8.4545730044, 9.7625), x_dir=(0.8660254038, 0.5, 0), z_dir=(0.3535533906, -0.6123724357, -0.7071067812)), keep=Keep.TOP)


with BuildPart() as f1_19:
    add(f1_18.part)

    # F3_t1: union F3_tool2
    add(f3_tool2.part)


with BuildPart() as f3_tool8:
    # F3_s9 → F3_t10 (new body)
    with BuildSketch(Plane.XY.offset(-5.7168783649)):
        with BuildLine():
            ThreePointArc((-16.05, 6.3508529611), (-14.2198729811, 8.18097998), (-13.55, 10.68097998))
            Line((-13.55, 10.68097998), (-13.55, 7.7942286341))
            Line((-13.55, 7.7942286341), (-16.05, 6.3508529611))
        make_face()
    extrude(amount=F3_T10_DEPTH)

    split(bisect_by=Plane(origin=(-9.775, 0, 9.775), x_dir=(0, 1, 0), z_dir=(0.7071067812, 0, -0.7071067812)), keep=Keep.TOP)

    split(bisect_by=Plane(origin=(-3.00625, 5.2069777403, -6.0125), x_dir=(0.8660254038, 0.5, 0), z_dir=(0.3535533906, -0.6123724357, 0.7071067812)), keep=Keep.TOP)


with BuildPart() as f1_20:
    add(f1_19.part)

    # F3_t7: union F3_tool8
    add(f3_tool8.part)


with BuildPart() as f3_tool14:
    # F3_s15 → F3_t16 (new body)
    with BuildSketch(Plane.XY.offset(-5.7168783649)):
        with BuildLine():
            ThreePointArc((-16.05, 6.3508529611), (-14.2198729811, 8.18097998), (-13.55, 10.68097998))
            Line((-13.55, 10.68097998), (-13.55, 7.7942286341))
            Line((-13.55, 7.7942286341), (-16.05, 6.3508529611))
        make_face()
    extrude(amount=F3_T16_DEPTH)

    split(bisect_by=Plane(origin=(-3.00625, 5.2069777403, -6.0125), x_dir=(-0.8660254038, -0.5, 0), z_dir=(-0.3535533906, 0.6123724357, -0.7071067812)), keep=Keep.TOP)

    split(bisect_by=Plane(origin=(-4.88125, 8.4545730044, 9.7625), x_dir=(-0.8660254038, -0.5, 0), z_dir=(-0.3535533906, 0.6123724357, 0.7071067812)), keep=Keep.TOP)


with BuildPart() as f1_21:
    add(f1_20.part)

    # F3_t13: union F3_tool14
    add(f3_tool14.part)


with BuildPart() as f3_tool20:
    # F3_s21 → F3_t22 (new body)
    with BuildSketch(Plane.XY.offset(-5.7168783649)):
        with BuildLine():
            ThreePointArc((-16.05, 6.3508529611), (-14.2198729811, 8.18097998), (-13.55, 10.68097998))
            Line((-13.55, 10.68097998), (-13.55, 7.7942286341))
            Line((-13.55, 7.7942286341), (-16.05, 6.3508529611))
        make_face()
    extrude(amount=F3_T22_DEPTH)

    split(bisect_by=Plane(origin=(-3.00625, 5.2069777403, -6.0125), x_dir=(0.8660254038, 0.5, 0), z_dir=(0.3535533906, -0.6123724357, 0.7071067812)), keep=Keep.TOP)

    split(bisect_by=Plane(origin=(-4.88125, 8.4545730044, 9.7625), x_dir=(0.8660254038, 0.5, 0), z_dir=(0.3535533906, -0.6123724357, -0.7071067812)), keep=Keep.TOP)


with BuildPart() as f1_22:
    add(f1_21.part)

    # F3_t19: union F3_tool20
    add(f3_tool20.part)


with BuildPart() as f3_tool26:
    # F3_s27 → F3_t28 (new body)
    with BuildSketch(Plane.XY.offset(-5.7168783649)):
        with BuildLine():
            ThreePointArc((13.55, 10.68097998), (14.2198729811, 8.18097998), (16.05, 6.3508529611))
            Line((16.05, 6.3508529611), (13.55, 7.7942286341))
            Line((13.55, 7.7942286341), (13.55, 10.68097998))
        make_face()
    extrude(amount=F3_T28_DEPTH)

    split(bisect_by=Plane(origin=(4.88125, 8.4545730044, 9.7625), x_dir=(0.8660254038, -0.5, 0), z_dir=(-0.3535533906, -0.6123724357, -0.7071067812)), keep=Keep.TOP)

    split(bisect_by=Plane(origin=(3.00625, 5.2069777403, -6.0125), x_dir=(0.8660254038, -0.5, 0), z_dir=(-0.3535533906, -0.6123724357, 0.7071067812)), keep=Keep.TOP)


with BuildPart() as f1_23:
    add(f1_22.part)

    # F3_t25: union F3_tool26
    add(f3_tool26.part)


with BuildPart() as f3_tool32:
    # F3_s33 → F3_t34 (new body)
    with BuildSketch(Plane.XY.offset(-5.7168783649)):
        with BuildLine():
            ThreePointArc((13.55, 10.68097998), (14.2198729811, 8.18097998), (16.05, 6.3508529611))
            Line((16.05, 6.3508529611), (13.55, 7.7942286341))
            Line((13.55, 7.7942286341), (13.55, 10.68097998))
        make_face()
    extrude(amount=F3_T34_DEPTH)

    split(bisect_by=Plane(origin=(9.775, 0, 9.775), x_dir=(0, 1, 0), z_dir=(-0.7071067812, 0, -0.7071067812)), keep=Keep.TOP)

    split(bisect_by=Plane(origin=(6.025, 0, -6.025), x_dir=(0, 1, 0), z_dir=(-0.7071067812, 0, 0.7071067812)), keep=Keep.TOP)


with BuildPart() as f1_24:
    add(f1_23.part)

    # F3_t31: union F3_tool32
    add(f3_tool32.part)


with BuildPart() as f3_tool38:
    # F3_s39 → F3_t40 (new body)
    with BuildSketch(Plane.XY.offset(-5.7168783649)):
        with BuildLine():
            ThreePointArc((-2.5, -17.1184354815), (0, -16.4485625004), (2.5, -17.1184354815))
            Line((2.5, -17.1184354815), (0, -15.6750598085))
            Line((0, -15.6750598085), (-2.5, -17.1184354815))
        make_face()
    extrude(amount=F3_T40_DEPTH)

    split(bisect_by=Plane(origin=(-3.01875, -5.2286283753, -6.0375), x_dir=(-0.8660254038, 0.5, 0), z_dir=(0.3535533906, 0.6123724357, 0.7071067812)), keep=Keep.TOP)

    split(bisect_by=Plane(origin=(4.89375, -8.4762236395, 9.7875), x_dir=(-0.8660254038, -0.5, 0), z_dir=(-0.3535533906, 0.6123724357, -0.7071067812)), keep=Keep.TOP)


with BuildPart() as f1_25:
    add(f1_24.part)

    # F3_t37: union F3_tool38
    add(f3_tool38.part)


with BuildPart() as f3_tool44:
    # F3_s45 → F3_t46 (new body)
    with BuildSketch(Plane.XY.offset(-5.7168783649)):
        with BuildLine():
            ThreePointArc((-2.5, -17.1184354815), (0, -16.4485625004), (2.5, -17.1184354815))
            Line((2.5, -17.1184354815), (0, -15.6750598085))
            Line((0, -15.6750598085), (-2.5, -17.1184354815))
        make_face()
    extrude(amount=F3_T46_DEPTH)

    split(bisect_by=Plane(origin=(-4.89375, -8.4762236395, 9.7875), x_dir=(-0.8660254038, 0.5, 0), z_dir=(0.3535533906, 0.6123724357, -0.7071067812)), keep=Keep.TOP)

    split(bisect_by=Plane(origin=(3.01875, -5.2286283753, -6.0375), x_dir=(-0.8660254038, -0.5, 0), z_dir=(-0.3535533906, 0.6123724357, 0.7071067812)), keep=Keep.TOP)


with BuildPart() as f1_26:
    add(f1_25.part)

    # F3_t43: union F3_tool44
    add(f3_tool44.part)


with BuildPart() as f3_tool50:
    # F3_s51 → F3_t52 (new body)
    with BuildSketch(Plane.XY.offset(-5.7168783649)):
        with BuildLine():
            ThreePointArc((-2.5, -17.1184354815), (0, -16.4485625004), (2.5, -17.1184354815))
            Line((2.5, -17.1184354815), (0, -15.6750598085))
            Line((0, -15.6750598085), (-2.5, -17.1184354815))
        make_face()
    extrude(amount=F3_T52_DEPTH)

    split(bisect_by=Plane(origin=(4.89375, -8.4762236395, 9.7875), x_dir=(0.8660254038, 0.5, 0), z_dir=(0.3535533906, -0.6123724357, 0.7071067812)), keep=Keep.TOP)

    split(bisect_by=Plane(origin=(3.01875, -5.2286283753, -6.0375), x_dir=(0.8660254038, 0.5, 0), z_dir=(0.3535533906, -0.6123724357, -0.7071067812)), keep=Keep.TOP)


with BuildPart() as f1_27:
    add(f1_26.part)

    # F3_t49: union F3_tool50
    add(f3_tool50.part)


with BuildPart() as f3_tool56:
    # F3_s57 → F3_t58 (new body)
    with BuildSketch(Plane.XY.offset(-5.7168783649)):
        with BuildLine():
            ThreePointArc((-2.5, -17.1184354815), (0, -16.4485625004), (2.5, -17.1184354815))
            Line((2.5, -17.1184354815), (0, -15.6750598085))
            Line((0, -15.6750598085), (-2.5, -17.1184354815))
        make_face()
    extrude(amount=F3_T58_DEPTH)

    split(bisect_by=Plane(origin=(4.89375, -8.4762236395, 9.7875), x_dir=(-0.8660254038, -0.5, 0), z_dir=(-0.3535533906, 0.6123724357, -0.7071067812)), keep=Keep.TOP)

    split(bisect_by=Plane(origin=(3.01875, -5.2286283753, -6.0375), x_dir=(-0.8660254038, -0.5, 0), z_dir=(-0.3535533906, 0.6123724357, 0.7071067812)), keep=Keep.TOP)


with BuildPart() as f1_28:
    add(f1_27.part)

    # F3_t55: union F3_tool56
    add(f3_tool56.part)


solid = f1_28.part
